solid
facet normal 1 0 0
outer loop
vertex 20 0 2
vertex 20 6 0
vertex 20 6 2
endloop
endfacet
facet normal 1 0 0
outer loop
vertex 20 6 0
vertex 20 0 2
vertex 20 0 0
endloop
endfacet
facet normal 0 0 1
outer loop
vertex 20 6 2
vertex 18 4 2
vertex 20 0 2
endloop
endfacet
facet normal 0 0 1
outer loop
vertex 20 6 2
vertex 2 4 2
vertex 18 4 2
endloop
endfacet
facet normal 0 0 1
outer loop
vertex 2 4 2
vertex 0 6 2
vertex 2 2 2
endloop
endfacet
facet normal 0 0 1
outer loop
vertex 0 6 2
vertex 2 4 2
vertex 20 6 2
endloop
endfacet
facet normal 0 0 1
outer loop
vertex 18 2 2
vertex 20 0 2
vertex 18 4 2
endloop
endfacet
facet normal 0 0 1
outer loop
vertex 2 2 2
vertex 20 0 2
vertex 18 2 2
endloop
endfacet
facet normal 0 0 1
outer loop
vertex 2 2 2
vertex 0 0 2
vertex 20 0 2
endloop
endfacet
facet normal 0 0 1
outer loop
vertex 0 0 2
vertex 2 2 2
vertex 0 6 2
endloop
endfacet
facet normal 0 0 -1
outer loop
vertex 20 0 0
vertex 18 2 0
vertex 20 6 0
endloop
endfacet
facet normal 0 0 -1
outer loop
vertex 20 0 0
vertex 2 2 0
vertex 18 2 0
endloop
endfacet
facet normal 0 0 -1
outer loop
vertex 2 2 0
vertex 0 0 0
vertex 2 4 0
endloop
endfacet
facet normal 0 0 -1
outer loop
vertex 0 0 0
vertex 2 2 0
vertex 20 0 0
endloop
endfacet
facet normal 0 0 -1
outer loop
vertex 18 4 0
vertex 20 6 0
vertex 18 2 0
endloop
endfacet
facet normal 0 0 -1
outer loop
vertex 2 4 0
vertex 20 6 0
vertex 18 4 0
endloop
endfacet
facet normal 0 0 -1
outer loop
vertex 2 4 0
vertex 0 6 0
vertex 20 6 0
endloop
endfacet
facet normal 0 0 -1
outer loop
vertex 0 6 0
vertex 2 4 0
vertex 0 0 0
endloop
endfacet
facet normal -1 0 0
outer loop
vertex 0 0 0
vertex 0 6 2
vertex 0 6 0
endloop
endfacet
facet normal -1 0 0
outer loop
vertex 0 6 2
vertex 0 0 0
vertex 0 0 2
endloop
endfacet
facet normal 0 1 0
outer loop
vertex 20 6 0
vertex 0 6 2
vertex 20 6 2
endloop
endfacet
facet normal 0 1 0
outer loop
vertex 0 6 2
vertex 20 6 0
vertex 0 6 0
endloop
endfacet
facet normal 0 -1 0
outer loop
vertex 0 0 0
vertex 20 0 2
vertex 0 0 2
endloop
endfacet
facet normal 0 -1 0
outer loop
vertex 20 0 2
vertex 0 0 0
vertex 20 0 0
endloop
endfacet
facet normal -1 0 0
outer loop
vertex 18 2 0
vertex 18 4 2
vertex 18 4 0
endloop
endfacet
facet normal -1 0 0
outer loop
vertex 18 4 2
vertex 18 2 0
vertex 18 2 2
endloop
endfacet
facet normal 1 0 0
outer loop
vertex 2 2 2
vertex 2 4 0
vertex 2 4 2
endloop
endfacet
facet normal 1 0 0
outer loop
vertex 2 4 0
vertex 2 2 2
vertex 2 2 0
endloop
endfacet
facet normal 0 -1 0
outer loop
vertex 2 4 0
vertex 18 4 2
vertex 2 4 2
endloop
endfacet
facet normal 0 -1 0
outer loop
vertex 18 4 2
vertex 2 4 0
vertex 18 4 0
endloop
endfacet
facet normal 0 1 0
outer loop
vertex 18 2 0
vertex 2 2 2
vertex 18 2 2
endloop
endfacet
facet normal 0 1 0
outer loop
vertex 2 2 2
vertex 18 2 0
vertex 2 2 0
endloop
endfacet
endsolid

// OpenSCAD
width = 20;
height = 6;
length = 2;

difference() {
    cube([width, height, length]);

    translate([2, 2, 0]) {
        cube([(width - 4), (height / 3), length]);
    }
}
